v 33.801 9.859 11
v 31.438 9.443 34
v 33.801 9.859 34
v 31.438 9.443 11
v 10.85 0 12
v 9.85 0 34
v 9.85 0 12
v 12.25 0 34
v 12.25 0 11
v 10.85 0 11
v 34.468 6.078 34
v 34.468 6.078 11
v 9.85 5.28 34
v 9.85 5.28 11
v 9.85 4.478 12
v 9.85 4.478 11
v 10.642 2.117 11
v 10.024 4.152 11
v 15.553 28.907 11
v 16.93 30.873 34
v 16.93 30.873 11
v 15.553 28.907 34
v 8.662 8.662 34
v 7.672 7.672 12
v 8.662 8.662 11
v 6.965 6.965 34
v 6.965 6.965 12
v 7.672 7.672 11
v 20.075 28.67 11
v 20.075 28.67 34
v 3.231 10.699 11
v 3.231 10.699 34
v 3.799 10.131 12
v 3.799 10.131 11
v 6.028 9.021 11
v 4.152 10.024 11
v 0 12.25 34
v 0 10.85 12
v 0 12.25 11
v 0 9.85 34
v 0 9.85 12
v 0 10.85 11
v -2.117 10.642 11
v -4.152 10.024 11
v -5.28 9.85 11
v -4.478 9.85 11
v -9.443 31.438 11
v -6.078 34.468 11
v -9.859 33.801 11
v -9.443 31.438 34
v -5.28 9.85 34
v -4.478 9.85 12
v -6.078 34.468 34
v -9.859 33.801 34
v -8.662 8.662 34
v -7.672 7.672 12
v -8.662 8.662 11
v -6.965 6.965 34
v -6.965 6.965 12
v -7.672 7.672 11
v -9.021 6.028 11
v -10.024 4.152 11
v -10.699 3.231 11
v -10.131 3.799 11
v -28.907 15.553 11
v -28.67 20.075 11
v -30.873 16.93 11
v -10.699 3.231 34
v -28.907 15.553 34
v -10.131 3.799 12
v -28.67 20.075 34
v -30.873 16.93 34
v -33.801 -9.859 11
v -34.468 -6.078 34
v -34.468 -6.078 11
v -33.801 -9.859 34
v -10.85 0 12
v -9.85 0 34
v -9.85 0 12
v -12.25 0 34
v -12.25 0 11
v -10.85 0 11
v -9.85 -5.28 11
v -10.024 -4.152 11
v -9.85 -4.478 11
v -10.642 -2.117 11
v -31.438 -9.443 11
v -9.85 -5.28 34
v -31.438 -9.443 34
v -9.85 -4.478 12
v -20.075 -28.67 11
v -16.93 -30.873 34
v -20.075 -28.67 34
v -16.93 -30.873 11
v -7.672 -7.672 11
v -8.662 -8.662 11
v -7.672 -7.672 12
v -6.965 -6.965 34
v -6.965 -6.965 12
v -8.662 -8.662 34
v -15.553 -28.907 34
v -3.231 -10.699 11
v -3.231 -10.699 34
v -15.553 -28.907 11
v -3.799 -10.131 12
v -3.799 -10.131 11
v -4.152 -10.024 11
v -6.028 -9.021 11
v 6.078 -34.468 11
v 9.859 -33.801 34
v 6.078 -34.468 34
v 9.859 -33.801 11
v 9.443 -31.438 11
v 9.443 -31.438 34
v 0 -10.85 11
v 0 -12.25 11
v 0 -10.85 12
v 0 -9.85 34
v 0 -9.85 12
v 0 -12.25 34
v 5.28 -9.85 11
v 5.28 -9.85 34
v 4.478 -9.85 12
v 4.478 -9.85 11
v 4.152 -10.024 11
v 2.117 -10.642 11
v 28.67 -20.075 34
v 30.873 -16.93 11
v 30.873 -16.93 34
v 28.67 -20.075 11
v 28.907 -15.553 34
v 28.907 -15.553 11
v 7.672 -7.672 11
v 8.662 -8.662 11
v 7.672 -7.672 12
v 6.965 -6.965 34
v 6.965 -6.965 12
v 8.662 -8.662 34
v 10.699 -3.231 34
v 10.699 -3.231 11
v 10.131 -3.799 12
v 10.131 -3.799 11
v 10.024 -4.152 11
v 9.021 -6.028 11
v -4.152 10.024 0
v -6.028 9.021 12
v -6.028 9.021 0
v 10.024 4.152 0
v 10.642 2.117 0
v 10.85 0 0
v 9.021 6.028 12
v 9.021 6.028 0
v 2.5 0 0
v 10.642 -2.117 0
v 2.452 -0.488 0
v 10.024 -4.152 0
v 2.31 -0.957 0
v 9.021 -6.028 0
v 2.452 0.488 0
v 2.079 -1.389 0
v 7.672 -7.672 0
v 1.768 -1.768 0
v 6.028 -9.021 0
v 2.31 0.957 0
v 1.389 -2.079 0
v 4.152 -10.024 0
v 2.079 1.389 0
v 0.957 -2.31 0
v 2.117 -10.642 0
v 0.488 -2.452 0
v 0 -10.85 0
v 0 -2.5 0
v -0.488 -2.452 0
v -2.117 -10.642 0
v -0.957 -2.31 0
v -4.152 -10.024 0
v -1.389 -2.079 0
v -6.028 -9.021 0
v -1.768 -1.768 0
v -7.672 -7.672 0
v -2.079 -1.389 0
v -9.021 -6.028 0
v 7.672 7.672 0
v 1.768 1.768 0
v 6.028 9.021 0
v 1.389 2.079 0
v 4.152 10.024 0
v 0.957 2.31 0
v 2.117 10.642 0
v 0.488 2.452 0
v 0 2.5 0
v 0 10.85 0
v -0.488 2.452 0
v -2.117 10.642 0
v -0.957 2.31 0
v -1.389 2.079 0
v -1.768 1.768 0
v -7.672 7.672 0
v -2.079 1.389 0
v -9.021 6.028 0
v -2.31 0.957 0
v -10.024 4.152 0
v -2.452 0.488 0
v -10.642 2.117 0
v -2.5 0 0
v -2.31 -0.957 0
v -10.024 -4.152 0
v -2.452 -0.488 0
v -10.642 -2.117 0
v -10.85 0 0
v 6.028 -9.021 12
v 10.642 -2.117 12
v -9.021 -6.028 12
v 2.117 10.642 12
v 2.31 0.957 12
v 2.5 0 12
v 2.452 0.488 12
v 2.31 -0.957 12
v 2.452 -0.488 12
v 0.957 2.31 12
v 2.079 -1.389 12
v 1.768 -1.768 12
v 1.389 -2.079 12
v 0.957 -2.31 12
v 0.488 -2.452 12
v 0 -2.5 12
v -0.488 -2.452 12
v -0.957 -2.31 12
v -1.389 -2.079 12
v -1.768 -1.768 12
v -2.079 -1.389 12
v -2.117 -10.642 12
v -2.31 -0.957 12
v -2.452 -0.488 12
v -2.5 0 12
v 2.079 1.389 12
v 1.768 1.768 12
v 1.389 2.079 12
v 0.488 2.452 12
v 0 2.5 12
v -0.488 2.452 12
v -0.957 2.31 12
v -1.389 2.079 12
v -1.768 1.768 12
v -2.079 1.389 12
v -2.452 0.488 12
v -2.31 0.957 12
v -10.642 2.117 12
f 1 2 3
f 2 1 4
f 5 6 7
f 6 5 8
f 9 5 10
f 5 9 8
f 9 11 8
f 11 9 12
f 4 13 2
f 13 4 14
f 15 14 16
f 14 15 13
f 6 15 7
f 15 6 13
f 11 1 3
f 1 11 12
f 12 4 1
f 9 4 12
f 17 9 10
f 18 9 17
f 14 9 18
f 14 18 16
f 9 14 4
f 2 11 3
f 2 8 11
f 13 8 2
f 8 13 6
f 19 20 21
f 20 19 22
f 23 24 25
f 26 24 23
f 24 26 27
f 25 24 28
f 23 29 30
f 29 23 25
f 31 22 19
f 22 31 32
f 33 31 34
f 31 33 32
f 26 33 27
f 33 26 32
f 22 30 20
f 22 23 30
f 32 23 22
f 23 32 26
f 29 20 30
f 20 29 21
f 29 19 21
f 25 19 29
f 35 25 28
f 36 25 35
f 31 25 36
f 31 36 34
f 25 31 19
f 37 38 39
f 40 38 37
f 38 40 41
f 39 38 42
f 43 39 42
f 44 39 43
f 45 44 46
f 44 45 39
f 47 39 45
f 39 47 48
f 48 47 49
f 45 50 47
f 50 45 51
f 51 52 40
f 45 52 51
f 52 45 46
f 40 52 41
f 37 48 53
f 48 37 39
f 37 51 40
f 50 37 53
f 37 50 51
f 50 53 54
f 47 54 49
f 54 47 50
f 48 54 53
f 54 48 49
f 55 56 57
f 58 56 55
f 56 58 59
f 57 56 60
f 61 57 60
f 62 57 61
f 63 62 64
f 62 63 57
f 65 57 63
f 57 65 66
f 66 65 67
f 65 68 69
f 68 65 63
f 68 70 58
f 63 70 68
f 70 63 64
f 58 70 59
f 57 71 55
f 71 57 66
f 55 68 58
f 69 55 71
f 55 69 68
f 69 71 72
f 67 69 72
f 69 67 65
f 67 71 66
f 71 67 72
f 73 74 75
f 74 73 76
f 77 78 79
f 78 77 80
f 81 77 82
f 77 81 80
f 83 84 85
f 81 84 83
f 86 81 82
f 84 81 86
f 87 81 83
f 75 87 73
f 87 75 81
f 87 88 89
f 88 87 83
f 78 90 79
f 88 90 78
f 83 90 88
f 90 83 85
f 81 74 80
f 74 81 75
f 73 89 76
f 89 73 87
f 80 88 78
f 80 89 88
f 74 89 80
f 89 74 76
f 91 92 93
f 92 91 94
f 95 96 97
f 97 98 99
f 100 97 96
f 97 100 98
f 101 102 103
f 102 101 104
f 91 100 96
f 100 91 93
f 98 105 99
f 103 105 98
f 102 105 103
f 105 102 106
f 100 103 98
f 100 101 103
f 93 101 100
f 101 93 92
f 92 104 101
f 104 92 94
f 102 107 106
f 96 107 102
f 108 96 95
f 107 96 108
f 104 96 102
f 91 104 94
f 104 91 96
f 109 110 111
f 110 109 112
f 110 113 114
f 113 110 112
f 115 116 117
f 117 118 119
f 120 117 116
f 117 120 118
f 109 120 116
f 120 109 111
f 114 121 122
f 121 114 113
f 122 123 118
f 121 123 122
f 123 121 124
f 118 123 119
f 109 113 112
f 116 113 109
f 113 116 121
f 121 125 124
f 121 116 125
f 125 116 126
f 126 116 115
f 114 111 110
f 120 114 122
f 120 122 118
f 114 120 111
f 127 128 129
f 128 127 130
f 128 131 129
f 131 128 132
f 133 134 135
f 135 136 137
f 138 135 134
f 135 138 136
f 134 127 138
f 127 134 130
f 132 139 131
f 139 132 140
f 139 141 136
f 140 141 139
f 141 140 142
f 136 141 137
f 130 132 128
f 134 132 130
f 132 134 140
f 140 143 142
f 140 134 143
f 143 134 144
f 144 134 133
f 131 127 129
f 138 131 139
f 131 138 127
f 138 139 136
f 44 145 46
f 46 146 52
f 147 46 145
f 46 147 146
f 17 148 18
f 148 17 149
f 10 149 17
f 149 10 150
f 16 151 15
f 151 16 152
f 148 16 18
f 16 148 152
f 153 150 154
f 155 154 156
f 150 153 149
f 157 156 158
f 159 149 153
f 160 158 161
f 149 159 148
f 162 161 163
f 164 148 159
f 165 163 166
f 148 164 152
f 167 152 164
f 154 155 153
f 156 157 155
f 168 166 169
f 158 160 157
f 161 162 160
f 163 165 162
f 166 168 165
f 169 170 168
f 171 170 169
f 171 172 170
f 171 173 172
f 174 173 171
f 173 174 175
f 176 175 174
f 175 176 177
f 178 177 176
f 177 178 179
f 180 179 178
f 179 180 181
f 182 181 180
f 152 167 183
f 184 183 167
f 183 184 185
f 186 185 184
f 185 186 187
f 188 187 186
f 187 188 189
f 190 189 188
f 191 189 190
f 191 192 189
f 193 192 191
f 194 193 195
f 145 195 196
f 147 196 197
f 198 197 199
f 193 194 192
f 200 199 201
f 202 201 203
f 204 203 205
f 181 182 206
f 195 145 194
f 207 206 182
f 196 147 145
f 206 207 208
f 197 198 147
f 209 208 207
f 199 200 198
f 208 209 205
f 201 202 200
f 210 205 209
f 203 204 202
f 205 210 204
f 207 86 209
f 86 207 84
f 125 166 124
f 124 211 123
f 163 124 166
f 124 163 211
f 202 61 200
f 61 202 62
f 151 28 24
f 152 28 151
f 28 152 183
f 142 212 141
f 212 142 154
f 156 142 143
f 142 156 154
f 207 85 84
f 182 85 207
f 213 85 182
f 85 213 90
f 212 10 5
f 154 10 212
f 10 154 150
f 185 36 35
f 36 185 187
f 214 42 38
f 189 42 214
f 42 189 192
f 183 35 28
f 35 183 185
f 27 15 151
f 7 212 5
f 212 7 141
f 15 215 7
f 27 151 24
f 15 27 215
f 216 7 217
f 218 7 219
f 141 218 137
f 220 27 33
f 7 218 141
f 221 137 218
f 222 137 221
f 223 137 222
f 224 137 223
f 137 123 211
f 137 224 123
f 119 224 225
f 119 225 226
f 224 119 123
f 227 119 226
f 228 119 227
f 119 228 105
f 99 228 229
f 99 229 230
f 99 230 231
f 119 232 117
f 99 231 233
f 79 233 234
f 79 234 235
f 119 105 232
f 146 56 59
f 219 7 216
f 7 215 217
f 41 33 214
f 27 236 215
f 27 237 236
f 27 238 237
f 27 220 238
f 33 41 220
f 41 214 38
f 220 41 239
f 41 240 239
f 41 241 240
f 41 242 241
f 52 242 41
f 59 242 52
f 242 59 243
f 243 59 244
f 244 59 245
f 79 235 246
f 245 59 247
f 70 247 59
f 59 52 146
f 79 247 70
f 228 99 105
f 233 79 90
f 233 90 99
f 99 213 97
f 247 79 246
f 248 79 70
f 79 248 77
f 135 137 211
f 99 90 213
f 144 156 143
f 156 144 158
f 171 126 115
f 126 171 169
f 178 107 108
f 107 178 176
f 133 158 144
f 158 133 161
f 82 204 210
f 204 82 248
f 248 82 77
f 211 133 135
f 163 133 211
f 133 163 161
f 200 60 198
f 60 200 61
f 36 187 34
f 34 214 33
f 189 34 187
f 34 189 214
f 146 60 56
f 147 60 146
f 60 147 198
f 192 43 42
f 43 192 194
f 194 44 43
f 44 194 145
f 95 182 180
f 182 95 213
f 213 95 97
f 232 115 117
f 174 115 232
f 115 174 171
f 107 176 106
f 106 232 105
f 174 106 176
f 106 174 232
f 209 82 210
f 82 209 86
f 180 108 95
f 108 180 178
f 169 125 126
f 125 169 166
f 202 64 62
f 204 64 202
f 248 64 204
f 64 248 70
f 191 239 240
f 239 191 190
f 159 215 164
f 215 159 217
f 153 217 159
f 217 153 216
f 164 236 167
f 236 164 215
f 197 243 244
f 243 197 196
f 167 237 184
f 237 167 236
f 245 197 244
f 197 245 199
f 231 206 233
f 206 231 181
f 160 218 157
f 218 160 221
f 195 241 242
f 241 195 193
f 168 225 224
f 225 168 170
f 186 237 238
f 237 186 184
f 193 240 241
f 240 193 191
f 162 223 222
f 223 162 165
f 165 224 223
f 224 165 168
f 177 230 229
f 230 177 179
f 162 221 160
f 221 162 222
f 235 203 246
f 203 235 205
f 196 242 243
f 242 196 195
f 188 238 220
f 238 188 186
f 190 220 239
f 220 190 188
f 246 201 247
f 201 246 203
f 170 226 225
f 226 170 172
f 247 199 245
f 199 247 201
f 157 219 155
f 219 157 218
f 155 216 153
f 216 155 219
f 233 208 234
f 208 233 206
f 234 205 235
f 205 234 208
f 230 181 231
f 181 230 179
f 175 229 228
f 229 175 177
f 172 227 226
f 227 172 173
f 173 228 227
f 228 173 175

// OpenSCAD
$fn = 32;

// ----------------------------------------------------------------------
// Impeller: 70 mm, 8 blades, 34 mm tall
// ----------------------------------------------------------------------

// --- parameters (mm) ---
hub_d = 21.7;             // hub diameter
hub_h = 12;               // hub height
imp_d = 70;               // outer diameter over the blades
blades = 8;               // number of blades
blade_t = 2.4;            // blade thickness
blade_h = 22;             // blade height
blade_in_r = 9.85;        // blade root radius
blade_out_r = 32.6;       // blade tip radius
sweep = 10;               // blade sweep, degrees
bore_d = 5;               // shaft bore

module hub() {
  cylinder(h = hub_h, d = hub_d);
}

module blade() {
  /* blade swept between two boxes: hull of the root and the tip section */
  hull() {
    translate([blade_in_r, 0, hub_h - 1])
      cube([blade_t, blade_t * 2.2, blade_h + 1], center = false);
    rotate([0, 0, sweep])
      translate([blade_out_r, 0, hub_h - 1])
        cube([blade_t, blade_t * 1.6, blade_h + 1], center = false);
  }
}

module blades() {
  for (i = [0 : blades - 1])
    rotate([0, 0, i * 360 / blades]) blade();
}

difference() {
  union() {
    hub();
    blades();
  }
  translate([0, 0, -1]) cylinder(h = hub_h + blade_h + 0 + 3, d = bore_d);
}
